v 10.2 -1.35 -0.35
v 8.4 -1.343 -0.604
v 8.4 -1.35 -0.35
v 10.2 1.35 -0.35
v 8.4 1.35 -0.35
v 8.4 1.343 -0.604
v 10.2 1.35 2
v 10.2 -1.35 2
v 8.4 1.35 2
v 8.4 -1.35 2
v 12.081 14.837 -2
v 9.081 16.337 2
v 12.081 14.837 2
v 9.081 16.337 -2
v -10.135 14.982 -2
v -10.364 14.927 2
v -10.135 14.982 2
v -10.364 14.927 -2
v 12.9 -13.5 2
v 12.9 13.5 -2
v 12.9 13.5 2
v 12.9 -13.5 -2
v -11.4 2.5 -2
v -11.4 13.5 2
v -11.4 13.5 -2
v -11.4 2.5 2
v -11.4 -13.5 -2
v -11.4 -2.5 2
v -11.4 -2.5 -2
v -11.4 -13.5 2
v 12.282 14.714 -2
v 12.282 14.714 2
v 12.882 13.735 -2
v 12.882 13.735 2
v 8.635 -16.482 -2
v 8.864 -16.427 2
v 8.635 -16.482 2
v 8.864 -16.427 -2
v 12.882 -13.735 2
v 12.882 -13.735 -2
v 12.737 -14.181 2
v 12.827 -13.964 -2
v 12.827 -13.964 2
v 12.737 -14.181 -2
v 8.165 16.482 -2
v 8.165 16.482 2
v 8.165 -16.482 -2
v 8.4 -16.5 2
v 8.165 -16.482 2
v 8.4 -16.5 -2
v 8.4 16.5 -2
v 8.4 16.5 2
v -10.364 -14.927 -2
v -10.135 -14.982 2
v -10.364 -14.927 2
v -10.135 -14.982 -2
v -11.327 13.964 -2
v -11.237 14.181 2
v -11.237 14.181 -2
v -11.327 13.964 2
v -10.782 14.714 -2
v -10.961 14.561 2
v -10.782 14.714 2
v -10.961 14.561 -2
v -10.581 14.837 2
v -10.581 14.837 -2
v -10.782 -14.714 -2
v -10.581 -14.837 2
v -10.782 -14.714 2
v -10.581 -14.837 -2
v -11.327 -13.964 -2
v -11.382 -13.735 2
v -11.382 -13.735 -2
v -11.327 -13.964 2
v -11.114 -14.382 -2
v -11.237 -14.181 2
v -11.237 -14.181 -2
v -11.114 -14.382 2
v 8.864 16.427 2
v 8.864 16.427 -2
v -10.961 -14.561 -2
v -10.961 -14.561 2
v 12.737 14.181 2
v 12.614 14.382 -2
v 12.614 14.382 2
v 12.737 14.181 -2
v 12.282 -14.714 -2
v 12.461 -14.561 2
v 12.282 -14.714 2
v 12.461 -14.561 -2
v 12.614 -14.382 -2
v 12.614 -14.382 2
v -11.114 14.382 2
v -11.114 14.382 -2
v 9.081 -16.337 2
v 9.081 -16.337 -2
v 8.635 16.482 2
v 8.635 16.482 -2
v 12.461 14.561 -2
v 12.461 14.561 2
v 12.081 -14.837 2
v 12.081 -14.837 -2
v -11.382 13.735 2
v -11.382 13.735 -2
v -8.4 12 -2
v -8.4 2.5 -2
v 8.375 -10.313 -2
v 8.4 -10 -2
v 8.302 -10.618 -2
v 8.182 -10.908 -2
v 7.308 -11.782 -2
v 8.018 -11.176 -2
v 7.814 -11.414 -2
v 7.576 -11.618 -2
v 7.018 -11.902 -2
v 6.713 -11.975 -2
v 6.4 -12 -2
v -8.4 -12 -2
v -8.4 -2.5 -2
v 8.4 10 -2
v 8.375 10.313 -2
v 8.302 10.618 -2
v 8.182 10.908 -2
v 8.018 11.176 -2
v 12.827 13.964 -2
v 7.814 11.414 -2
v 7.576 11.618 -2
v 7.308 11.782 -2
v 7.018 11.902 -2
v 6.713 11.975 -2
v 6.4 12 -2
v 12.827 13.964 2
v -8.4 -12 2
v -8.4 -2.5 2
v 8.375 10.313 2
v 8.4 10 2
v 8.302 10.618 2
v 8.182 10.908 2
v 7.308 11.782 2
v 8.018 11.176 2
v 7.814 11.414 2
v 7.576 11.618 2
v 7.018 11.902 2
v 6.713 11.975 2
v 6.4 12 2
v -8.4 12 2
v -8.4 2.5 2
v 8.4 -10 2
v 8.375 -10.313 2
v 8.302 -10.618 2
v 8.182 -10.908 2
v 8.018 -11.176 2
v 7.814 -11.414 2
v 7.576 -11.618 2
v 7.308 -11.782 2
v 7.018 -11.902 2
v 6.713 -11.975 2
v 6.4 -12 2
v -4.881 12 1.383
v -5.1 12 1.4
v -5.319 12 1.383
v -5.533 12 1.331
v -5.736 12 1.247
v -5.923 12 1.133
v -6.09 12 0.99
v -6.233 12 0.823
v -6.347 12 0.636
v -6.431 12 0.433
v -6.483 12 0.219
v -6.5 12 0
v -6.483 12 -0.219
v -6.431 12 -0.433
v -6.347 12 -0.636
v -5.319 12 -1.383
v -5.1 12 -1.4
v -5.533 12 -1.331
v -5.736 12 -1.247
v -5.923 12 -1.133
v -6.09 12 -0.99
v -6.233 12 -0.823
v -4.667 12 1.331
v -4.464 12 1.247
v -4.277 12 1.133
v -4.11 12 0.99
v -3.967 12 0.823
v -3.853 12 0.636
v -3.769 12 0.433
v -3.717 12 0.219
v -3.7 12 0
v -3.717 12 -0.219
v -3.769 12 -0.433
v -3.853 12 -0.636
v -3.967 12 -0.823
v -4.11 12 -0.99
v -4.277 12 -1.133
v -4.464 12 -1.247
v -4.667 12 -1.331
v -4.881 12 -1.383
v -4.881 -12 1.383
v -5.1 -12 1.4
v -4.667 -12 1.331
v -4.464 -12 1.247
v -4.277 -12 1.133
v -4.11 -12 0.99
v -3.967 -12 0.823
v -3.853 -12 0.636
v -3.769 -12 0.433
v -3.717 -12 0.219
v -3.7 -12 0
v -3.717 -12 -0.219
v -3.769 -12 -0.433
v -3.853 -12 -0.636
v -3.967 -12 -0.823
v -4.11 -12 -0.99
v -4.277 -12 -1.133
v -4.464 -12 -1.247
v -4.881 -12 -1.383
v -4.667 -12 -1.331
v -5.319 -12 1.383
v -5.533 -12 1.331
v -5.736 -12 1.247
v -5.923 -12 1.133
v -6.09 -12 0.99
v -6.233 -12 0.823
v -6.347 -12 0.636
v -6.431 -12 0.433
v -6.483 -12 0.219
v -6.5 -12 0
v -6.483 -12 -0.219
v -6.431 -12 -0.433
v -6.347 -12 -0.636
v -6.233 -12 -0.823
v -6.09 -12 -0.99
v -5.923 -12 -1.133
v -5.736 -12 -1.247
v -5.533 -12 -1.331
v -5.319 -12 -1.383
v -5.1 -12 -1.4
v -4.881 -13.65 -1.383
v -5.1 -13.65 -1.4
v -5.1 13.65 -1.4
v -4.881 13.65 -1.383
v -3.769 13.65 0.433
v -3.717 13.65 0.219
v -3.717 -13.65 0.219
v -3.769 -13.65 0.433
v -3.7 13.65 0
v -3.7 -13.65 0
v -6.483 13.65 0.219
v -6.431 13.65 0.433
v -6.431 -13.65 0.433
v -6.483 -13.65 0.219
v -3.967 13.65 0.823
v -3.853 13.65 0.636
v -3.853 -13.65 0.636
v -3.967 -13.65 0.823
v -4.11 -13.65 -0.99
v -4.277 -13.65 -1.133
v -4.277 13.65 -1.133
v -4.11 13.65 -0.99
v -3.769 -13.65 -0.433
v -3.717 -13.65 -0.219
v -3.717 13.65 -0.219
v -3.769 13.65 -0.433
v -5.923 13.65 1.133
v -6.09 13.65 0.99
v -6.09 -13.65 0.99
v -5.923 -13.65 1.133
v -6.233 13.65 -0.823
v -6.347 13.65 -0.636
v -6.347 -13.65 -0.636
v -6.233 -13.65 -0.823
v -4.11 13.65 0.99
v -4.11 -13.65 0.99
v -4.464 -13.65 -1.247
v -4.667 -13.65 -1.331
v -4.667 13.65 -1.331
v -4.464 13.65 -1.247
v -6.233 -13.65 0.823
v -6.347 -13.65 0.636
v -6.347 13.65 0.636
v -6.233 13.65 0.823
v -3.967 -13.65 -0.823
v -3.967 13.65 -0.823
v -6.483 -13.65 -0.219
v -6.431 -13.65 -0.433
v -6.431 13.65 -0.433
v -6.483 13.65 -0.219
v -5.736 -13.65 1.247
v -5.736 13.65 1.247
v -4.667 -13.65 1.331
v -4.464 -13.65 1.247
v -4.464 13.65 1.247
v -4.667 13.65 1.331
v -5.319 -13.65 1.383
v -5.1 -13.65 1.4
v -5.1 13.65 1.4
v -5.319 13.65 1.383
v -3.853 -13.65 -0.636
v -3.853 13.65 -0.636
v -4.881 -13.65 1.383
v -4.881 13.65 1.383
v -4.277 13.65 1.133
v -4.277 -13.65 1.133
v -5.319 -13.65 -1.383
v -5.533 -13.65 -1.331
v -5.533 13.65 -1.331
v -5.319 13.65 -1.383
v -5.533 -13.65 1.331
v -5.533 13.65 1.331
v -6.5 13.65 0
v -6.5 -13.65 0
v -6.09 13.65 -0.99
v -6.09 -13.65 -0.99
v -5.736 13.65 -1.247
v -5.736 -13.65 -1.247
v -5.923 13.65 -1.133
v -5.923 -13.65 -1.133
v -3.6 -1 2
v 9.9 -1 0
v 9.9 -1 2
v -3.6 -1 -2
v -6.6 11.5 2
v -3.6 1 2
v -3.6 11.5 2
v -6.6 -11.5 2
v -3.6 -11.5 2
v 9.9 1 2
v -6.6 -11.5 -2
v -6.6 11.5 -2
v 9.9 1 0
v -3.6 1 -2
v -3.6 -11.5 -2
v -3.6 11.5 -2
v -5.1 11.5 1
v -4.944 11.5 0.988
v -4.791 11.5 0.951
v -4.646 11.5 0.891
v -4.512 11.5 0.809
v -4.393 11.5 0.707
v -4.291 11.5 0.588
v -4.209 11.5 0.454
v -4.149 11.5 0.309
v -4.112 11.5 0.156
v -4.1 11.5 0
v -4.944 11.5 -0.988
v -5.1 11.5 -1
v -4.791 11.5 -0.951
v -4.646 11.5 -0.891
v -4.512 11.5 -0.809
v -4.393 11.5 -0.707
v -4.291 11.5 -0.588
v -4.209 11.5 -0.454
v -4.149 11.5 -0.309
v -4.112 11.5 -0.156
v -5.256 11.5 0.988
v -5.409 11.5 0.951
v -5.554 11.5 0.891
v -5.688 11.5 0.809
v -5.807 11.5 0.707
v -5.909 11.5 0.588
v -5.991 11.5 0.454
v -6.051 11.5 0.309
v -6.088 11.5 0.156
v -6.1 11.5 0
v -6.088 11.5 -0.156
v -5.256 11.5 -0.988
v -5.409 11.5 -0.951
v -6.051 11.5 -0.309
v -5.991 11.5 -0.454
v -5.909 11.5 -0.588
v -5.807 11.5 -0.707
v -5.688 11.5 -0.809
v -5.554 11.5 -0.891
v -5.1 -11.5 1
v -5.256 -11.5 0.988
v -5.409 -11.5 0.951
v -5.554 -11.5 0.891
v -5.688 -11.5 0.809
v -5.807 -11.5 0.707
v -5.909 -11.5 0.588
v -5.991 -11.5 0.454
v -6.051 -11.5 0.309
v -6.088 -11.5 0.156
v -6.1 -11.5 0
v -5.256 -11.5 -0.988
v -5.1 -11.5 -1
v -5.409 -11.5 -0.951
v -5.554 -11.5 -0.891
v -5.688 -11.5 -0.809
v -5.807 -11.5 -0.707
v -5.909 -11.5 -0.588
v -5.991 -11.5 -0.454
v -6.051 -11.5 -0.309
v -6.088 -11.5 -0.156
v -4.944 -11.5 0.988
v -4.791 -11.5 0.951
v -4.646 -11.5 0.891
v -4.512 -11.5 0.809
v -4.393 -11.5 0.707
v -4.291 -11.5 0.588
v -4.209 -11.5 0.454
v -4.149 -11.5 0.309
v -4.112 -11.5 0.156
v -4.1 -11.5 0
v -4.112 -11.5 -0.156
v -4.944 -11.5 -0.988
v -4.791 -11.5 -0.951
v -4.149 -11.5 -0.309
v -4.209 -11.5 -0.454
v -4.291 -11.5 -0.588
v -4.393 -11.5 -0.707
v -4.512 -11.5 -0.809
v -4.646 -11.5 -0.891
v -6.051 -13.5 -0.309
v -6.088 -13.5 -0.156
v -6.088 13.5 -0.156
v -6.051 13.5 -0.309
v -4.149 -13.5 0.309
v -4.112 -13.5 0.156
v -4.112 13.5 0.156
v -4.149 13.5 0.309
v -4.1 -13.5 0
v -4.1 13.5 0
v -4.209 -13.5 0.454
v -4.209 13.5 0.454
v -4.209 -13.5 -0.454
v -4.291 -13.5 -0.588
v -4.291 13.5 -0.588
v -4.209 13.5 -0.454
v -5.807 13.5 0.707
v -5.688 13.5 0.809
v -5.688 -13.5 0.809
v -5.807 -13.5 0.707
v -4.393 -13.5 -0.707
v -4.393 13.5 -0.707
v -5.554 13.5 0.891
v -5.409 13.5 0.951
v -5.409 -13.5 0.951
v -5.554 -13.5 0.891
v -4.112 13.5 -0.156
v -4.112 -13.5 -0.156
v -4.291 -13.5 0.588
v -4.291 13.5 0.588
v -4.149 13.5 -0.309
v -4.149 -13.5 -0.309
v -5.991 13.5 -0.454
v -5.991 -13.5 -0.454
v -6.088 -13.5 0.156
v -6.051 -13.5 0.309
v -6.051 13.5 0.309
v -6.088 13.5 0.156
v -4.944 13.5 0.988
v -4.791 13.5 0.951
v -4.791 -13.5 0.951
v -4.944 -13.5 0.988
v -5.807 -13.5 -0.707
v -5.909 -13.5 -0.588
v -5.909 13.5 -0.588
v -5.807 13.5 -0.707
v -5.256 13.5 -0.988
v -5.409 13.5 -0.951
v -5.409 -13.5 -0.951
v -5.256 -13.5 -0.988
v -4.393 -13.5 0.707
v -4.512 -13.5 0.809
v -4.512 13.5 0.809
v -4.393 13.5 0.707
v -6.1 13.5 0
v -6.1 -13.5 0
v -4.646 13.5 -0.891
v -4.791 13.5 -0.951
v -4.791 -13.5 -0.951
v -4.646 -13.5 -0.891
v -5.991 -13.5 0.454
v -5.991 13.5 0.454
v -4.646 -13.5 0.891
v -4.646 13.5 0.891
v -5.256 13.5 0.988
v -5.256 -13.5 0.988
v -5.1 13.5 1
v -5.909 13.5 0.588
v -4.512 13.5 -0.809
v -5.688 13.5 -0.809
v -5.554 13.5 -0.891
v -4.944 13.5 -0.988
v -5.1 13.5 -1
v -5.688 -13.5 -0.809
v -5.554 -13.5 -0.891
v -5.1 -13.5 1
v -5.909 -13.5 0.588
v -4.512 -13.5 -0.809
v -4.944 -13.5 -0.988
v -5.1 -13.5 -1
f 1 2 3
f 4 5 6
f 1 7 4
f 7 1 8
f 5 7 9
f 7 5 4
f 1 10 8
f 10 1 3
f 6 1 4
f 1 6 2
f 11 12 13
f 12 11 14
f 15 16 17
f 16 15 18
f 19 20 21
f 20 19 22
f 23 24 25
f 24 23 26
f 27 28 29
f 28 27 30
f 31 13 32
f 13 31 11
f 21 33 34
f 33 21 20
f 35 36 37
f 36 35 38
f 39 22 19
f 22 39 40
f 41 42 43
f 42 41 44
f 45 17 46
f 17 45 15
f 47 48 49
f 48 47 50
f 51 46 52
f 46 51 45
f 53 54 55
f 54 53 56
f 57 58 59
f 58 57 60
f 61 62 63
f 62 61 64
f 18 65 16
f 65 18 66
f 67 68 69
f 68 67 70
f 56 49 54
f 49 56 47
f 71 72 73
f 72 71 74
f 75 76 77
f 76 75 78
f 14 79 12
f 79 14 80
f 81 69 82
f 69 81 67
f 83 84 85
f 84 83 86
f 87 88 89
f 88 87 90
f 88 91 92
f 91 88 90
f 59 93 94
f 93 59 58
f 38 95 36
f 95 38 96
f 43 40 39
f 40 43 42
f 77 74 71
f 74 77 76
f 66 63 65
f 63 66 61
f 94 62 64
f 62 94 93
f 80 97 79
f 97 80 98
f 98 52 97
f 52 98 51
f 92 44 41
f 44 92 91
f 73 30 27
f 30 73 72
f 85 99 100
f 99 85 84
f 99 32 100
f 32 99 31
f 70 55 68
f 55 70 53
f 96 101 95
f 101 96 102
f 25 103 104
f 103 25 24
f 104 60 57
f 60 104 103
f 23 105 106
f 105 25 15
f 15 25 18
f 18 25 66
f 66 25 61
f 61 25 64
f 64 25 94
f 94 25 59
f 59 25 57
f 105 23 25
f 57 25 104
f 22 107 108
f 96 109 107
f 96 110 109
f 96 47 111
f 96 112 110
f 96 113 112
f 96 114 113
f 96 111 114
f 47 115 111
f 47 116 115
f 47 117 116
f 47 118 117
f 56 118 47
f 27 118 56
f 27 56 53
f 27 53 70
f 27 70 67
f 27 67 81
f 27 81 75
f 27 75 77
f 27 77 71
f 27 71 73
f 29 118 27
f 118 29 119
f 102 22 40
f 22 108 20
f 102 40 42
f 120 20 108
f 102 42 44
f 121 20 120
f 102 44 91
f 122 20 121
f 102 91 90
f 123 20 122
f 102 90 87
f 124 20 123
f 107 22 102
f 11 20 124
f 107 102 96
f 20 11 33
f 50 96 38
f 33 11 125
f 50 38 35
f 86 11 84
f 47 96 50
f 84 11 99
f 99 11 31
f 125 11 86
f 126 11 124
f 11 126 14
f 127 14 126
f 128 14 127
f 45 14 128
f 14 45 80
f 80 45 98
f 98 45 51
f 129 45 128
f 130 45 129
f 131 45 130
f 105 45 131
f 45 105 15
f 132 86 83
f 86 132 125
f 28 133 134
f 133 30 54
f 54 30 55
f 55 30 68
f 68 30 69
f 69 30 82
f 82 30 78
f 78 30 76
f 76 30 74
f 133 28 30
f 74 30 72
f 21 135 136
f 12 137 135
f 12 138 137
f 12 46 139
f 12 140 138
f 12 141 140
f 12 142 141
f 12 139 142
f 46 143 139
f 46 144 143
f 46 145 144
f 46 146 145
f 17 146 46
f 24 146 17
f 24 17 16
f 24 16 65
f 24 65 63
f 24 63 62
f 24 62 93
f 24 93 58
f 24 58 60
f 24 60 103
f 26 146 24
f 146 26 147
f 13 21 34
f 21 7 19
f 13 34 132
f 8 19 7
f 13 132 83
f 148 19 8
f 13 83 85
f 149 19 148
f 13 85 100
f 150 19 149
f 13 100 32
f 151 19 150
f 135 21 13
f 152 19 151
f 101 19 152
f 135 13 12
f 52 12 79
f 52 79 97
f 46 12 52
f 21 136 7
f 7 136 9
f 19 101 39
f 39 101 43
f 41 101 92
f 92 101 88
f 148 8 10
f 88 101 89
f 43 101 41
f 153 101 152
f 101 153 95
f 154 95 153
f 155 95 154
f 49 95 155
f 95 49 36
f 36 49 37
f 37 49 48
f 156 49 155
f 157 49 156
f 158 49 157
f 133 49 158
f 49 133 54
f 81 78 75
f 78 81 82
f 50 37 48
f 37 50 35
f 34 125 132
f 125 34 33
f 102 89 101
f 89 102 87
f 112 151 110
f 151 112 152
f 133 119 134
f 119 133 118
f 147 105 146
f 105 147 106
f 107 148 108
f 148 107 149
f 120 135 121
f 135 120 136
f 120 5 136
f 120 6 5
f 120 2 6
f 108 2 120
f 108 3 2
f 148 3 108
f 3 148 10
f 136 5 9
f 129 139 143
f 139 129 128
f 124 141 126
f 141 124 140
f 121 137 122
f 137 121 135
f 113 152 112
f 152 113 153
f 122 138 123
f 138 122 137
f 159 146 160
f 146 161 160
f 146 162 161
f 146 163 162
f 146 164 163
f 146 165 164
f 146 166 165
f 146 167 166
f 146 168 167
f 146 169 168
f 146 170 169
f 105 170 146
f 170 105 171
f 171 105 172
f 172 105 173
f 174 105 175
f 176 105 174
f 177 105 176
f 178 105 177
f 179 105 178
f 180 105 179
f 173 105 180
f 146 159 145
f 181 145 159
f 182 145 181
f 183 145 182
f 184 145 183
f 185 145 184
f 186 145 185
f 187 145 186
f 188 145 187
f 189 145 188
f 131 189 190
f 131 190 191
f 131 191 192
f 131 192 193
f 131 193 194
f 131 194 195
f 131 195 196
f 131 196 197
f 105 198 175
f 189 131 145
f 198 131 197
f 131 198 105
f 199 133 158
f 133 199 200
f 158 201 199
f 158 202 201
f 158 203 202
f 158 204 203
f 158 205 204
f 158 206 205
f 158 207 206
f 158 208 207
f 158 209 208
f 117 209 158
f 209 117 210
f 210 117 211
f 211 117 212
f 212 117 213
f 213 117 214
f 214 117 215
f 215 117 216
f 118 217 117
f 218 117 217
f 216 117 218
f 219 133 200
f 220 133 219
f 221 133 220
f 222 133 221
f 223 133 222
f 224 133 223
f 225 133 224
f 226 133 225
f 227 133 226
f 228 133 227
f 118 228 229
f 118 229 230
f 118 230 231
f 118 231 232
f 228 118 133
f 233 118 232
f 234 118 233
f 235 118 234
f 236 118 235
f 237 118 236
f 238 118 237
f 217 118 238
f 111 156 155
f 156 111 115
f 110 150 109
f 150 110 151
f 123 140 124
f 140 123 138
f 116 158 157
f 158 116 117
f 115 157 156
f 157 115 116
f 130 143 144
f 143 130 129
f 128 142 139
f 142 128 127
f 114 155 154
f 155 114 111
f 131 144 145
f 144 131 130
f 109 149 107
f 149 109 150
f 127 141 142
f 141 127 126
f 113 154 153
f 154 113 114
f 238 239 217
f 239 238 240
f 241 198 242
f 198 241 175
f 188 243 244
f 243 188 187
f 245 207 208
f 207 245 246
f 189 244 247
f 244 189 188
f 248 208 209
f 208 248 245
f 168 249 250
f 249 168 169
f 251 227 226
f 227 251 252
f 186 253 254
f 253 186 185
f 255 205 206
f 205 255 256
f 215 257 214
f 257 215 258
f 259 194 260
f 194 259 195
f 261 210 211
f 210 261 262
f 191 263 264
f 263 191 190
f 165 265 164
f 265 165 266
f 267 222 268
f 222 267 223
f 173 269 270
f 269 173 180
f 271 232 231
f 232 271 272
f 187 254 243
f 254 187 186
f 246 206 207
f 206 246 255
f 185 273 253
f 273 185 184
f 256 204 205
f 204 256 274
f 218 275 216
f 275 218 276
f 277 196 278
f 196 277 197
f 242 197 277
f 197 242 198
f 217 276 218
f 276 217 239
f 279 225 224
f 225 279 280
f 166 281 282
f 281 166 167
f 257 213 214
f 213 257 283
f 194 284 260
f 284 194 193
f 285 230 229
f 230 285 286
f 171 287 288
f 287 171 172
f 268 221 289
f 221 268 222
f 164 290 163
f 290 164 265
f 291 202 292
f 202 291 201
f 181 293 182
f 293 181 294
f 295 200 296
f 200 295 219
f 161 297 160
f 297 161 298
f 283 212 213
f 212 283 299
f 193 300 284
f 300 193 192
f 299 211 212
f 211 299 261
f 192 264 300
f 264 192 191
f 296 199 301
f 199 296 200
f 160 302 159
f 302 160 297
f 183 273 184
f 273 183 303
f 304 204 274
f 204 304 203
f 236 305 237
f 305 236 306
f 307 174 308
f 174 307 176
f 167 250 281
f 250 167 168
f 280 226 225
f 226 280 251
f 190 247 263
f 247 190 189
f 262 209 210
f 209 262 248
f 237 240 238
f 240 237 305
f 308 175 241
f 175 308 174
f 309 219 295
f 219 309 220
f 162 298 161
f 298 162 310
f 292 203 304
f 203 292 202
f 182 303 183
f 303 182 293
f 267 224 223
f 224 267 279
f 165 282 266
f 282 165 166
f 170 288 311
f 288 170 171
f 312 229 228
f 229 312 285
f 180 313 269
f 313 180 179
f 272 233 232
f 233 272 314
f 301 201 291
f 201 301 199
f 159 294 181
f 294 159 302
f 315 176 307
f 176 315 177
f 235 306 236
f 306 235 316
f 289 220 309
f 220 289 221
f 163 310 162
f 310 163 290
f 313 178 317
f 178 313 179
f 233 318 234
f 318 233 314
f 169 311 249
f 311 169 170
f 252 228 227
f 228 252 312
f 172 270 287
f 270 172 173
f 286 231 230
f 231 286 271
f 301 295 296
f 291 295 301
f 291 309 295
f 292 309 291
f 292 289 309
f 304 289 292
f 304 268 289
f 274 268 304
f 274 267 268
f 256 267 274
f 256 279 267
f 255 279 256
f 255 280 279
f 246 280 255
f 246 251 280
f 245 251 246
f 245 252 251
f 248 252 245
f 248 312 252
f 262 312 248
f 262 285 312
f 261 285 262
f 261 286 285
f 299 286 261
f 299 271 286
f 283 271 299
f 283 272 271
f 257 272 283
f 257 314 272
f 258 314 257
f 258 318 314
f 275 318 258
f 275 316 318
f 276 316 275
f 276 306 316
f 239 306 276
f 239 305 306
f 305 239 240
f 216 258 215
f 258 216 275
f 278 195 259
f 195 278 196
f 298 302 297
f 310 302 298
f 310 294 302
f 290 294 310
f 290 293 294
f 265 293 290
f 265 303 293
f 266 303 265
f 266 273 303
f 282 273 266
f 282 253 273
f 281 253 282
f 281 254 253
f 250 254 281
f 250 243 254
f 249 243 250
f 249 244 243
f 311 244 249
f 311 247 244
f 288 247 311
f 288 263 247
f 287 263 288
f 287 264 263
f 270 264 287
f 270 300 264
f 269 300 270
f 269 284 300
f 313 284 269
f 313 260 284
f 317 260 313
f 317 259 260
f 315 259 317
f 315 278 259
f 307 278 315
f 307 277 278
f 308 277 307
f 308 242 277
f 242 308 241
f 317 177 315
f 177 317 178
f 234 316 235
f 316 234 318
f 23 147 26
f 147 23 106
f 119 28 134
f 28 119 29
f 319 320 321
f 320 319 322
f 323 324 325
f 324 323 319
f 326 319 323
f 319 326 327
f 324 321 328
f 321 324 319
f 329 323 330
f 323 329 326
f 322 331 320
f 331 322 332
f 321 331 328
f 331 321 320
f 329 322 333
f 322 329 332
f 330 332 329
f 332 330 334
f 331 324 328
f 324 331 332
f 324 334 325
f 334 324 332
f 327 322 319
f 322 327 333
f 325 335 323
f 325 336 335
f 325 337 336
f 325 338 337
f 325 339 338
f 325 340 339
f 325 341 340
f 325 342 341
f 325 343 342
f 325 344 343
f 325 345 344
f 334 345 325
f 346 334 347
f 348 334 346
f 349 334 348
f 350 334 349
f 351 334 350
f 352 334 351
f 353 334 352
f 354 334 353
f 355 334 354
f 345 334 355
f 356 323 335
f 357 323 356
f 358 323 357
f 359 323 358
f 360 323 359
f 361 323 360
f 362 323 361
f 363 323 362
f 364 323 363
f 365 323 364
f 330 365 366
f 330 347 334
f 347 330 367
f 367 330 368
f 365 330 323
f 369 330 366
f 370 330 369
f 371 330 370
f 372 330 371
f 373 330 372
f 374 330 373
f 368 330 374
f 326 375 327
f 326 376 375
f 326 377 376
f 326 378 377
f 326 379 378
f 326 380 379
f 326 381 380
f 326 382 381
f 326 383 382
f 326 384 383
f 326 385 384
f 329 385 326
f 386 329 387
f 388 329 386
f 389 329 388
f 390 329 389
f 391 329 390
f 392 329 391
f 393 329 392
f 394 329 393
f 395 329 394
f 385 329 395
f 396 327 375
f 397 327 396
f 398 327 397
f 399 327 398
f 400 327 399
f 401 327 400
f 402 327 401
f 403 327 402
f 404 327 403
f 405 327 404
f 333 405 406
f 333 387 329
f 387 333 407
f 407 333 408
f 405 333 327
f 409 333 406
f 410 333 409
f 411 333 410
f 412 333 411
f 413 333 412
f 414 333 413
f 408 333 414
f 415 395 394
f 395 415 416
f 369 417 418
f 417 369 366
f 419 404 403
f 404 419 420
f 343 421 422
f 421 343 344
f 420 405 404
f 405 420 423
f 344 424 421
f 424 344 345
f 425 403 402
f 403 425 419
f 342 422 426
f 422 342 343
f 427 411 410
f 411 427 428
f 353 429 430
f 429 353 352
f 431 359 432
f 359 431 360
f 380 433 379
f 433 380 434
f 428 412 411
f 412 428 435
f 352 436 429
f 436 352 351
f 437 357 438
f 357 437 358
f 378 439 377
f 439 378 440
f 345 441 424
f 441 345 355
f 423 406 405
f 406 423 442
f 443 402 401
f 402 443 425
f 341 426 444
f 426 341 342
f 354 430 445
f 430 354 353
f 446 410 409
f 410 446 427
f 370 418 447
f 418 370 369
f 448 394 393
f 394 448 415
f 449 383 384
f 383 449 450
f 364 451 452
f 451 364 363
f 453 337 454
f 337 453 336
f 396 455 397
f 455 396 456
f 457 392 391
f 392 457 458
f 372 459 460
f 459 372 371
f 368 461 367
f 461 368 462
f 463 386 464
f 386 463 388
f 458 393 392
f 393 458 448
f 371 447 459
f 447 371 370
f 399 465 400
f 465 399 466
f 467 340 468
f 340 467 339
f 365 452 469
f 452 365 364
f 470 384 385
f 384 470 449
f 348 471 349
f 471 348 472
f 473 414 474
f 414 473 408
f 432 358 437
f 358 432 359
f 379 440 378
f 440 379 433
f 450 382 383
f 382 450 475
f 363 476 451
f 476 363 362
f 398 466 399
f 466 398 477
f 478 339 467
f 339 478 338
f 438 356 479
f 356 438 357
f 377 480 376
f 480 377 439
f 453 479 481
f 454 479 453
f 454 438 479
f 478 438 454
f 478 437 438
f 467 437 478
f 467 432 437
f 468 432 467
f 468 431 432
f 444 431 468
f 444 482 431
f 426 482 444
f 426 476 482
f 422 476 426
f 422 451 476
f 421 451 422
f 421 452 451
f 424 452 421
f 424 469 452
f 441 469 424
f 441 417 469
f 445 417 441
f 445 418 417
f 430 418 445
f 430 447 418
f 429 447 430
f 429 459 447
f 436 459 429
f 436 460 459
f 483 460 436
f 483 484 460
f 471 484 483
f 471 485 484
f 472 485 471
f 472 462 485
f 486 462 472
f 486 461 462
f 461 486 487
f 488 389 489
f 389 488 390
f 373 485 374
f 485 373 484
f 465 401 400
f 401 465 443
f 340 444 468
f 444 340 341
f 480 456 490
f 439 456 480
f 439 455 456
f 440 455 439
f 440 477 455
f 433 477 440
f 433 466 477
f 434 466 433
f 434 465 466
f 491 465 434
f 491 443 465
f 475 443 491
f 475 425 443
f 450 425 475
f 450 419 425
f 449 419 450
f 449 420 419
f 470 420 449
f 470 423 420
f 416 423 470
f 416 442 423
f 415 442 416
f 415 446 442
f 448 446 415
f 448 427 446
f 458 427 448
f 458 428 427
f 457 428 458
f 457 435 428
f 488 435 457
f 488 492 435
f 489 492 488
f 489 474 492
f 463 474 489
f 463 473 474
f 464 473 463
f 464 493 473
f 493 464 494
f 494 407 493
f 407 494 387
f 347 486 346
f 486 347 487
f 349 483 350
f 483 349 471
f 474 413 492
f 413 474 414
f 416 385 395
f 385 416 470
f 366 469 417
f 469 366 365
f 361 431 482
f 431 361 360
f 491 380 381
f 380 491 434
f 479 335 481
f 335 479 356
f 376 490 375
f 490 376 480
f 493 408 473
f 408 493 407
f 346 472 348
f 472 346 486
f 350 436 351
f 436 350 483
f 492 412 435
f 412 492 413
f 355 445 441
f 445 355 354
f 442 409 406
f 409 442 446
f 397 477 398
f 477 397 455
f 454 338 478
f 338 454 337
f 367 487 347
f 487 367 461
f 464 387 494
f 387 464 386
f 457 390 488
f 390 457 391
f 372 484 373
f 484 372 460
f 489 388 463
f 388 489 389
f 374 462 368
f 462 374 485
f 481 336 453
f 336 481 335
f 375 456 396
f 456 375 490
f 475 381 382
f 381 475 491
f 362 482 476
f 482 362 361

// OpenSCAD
//Watch Strap Buckle
//by Khairulmizam Samsudin, Sept 2016
//xource@gmail.com
//"watch_strap_buckle" is licenced under Creative Commons :
//Attribution-NonCommercial-ShareAlike 4.0 International (CC BY-NC-SA 4.0)
//http://creativecommons.org/licenses/by-nc-sa/4.0/

//UPDATES:
//4/10/2016 - Updates
//-Relax the printer tolerance requirement
//-Add strengthening fillet 
//23/9/2016 - Updates
//-Code cleanup
//-Added different frame shapes
//-Added print position option
//22/9/2016 - Released

/* [Options] */
// preview[view:south east, tilt:top diagonal]
// Watch strap thickness. Be sure to increase the thickness if the strap make several pass through the keeper. i.e. Nato or Zulu strap.   
Strap_thickness=1.2; // [1:10]
// Width of the strap.
Strap_width=24; // [5:30]
// Thickness of the buckle.
Buckle_thickness=3; // [3:6]
// Height of the buckle. The tip of the prong would be half of the buckle height
Buckle_height=4; // [4:6]
//Strap entry slit.
Slit = 1; //[0:No, 1:Yes]
//Frame shapes
Frame = 6; //[0:Square, 1:Round, 2:Square wide, 3:Round wide, 4:Trapezoid Square, 5:Trapezoid Round, 6: Custom 1, 7: Custom 2]
//Open the prong
Prong_open = 0; //[0:No, 1:Yes]
// Position for printing.
Print=0; // [0:No, 1:Yes]

/* [Hidden] */
strapW=Strap_width;
strapT=Strap_thickness;
buckleH=Buckle_height;
buckleT=Buckle_thickness;
buckleW=strapW+buckleT*2;
buckleL=15;
pinD=2;
pinR=pinD/2;
prongR=buckleH/2;
prongW=2;
prongRot=Prong_open;
slit=Slit;
slitAngle=0;
shape=Frame;
print=Print;
epsilon=0.1;
$fn=40;
frameL=buckleT+strapT*1.5+buckleL+buckleT;
strapX=-strapW/2-frameL/2+buckleT+strapT;
pinX=-buckleT/2+frameL/2-buckleT-strapT*1.5;

module strap() {
    cube([strapW,strapW,buckleH],center=true);
}

module fshape() {
    //%cube([frameL,buckleW,buckleH],center=true); 
    posX=(shape==0 || shape==1) ? frameL/2-buckleT/2 : frameL/2 ;
    posY=(shape==0 || shape==1 || shape==2 || shape==3) ? buckleW/2-buckleT/2 : buckleW/2;
    if (shape==0 || shape==2 || shape==4) { //square
        hull() {
            translate([0.5-frameL/2,0,0]) cube([1,buckleW,buckleH],center=true);
            translate([posX,posY,0]) cube([buckleT,buckleT,buckleH],center=true);
            translate([posX,-posY,0]) cube([buckleT,buckleT,buckleH],center=true);
        }
    } else if (shape==1 || shape==3 || shape==5) { //round
        hull() {
            translate([-frameL/2+buckleT/2,buckleW/2-buckleT/2,0]) cylinder(r=buckleT/2,h=buckleH,center=true);
            translate([-frameL/2+buckleT/2,-(buckleW/2-buckleT/2),0]) cylinder(r=buckleT/2,h=buckleH,center=true);
            translate([posX,posY,0]) cylinder(r=buckleT/2,h=buckleH,center=true);
            translate([posX,-posY,0]) cylinder(r=buckleT/2,h=buckleH,center=true);
        }
    } else if (shape==6) {
        hull() {
            translate([-frameL/2+buckleT/2,buckleW/2-buckleT/2,0]) cylinder(r=buckleT/2,h=buckleH,center=true);
            translate([-frameL/2+buckleT/2,-(buckleW/2-buckleT/2),0]) cylinder(r=buckleT/2,h=buckleH,center=true);
            translate([posX-buckleT,posY,0]) cylinder(r=buckleT/2,h=buckleH,center=true);
            translate([posX-buckleT,-posY,0]) cylinder(r=buckleT/2,h=buckleH,center=true);
            translate([posX,posY-buckleT/2,0]) cylinder(r=buckleT/2,h=buckleH,center=true);
            translate([posX,-posY+buckleT/2,0]) cylinder(r=buckleT/2,h=buckleH,center=true);
        }
    } else if (shape==7) {
        hull() {
            translate([0.5-frameL/2,0,0]) cube([1,buckleW,buckleH],center=true);
            factor=4;
            translate([posX,0,0]) scale([1,factor,1]) cylinder(r=buckleW/(factor*2),h=buckleH,center=true);
        }
    }
}
module frame() {
    difference() {
        fshape();
        translate([0,0,0]) hull() { 
            //cube([frameL-buckleT*2,strapW,buckleH+epsilon],center=true);
            coL=frameL-buckleT*2;
            coD=4;
            coR=coD/2;
            translate([0.5-coL/2,0,0]) cube([1,strapW,buckleH+epsilon],center=true);
            translate([-coR+coL/2,strapW/2-coR,0]) cylinder(r=coR,h=buckleH+epsilon,center=true);
            translate([-coR+coL/2,-strapW/2+coR,0]) cylinder(r=coR,h=buckleH+epsilon,center=true);
    }
        translate([-pinX,0,0]) pin(R=pinR+0.4,gap=0.3);
        translate([-pinX,0,0]) prong(gap=0.6,e=epsilon);
        if (slit) {
            rotate([0,0,slitAngle]) translate([-frameL/2+buckleT/2,0,0]) cube([buckleT+epsilon,buckleW/6,buckleH+epsilon],center=true);
        }
    }
}
module pin(R=pinR,gap=0) {
    rotate([90,0,0]) cylinder(r=R,h=buckleW-buckleT+gap,center=true);
}

module prong(gap=0,e=0) {
    hull() {
            cube([buckleT,prongW+gap,buckleH+gap],center=true);
            translate([pinX+buckleT/2/2+frameL/2-buckleT,0,buckleH/2/2]) cube([buckleT/2+gap,prongW+gap+e,buckleH/2+gap+e],center=true);
    }
      
    cube([buckleT,strapW-1.0,buckleH],center=true);
    pin();
}

rotX = print?180:0;
rotate([rotX,0,0]) union() {
    %translate([strapX,0,0]) strap();
    frame();
    rotY=prongRot?30:0;
    translate([-pinX,0,0]) rotate([0,-rotY,0]) prong();
}
